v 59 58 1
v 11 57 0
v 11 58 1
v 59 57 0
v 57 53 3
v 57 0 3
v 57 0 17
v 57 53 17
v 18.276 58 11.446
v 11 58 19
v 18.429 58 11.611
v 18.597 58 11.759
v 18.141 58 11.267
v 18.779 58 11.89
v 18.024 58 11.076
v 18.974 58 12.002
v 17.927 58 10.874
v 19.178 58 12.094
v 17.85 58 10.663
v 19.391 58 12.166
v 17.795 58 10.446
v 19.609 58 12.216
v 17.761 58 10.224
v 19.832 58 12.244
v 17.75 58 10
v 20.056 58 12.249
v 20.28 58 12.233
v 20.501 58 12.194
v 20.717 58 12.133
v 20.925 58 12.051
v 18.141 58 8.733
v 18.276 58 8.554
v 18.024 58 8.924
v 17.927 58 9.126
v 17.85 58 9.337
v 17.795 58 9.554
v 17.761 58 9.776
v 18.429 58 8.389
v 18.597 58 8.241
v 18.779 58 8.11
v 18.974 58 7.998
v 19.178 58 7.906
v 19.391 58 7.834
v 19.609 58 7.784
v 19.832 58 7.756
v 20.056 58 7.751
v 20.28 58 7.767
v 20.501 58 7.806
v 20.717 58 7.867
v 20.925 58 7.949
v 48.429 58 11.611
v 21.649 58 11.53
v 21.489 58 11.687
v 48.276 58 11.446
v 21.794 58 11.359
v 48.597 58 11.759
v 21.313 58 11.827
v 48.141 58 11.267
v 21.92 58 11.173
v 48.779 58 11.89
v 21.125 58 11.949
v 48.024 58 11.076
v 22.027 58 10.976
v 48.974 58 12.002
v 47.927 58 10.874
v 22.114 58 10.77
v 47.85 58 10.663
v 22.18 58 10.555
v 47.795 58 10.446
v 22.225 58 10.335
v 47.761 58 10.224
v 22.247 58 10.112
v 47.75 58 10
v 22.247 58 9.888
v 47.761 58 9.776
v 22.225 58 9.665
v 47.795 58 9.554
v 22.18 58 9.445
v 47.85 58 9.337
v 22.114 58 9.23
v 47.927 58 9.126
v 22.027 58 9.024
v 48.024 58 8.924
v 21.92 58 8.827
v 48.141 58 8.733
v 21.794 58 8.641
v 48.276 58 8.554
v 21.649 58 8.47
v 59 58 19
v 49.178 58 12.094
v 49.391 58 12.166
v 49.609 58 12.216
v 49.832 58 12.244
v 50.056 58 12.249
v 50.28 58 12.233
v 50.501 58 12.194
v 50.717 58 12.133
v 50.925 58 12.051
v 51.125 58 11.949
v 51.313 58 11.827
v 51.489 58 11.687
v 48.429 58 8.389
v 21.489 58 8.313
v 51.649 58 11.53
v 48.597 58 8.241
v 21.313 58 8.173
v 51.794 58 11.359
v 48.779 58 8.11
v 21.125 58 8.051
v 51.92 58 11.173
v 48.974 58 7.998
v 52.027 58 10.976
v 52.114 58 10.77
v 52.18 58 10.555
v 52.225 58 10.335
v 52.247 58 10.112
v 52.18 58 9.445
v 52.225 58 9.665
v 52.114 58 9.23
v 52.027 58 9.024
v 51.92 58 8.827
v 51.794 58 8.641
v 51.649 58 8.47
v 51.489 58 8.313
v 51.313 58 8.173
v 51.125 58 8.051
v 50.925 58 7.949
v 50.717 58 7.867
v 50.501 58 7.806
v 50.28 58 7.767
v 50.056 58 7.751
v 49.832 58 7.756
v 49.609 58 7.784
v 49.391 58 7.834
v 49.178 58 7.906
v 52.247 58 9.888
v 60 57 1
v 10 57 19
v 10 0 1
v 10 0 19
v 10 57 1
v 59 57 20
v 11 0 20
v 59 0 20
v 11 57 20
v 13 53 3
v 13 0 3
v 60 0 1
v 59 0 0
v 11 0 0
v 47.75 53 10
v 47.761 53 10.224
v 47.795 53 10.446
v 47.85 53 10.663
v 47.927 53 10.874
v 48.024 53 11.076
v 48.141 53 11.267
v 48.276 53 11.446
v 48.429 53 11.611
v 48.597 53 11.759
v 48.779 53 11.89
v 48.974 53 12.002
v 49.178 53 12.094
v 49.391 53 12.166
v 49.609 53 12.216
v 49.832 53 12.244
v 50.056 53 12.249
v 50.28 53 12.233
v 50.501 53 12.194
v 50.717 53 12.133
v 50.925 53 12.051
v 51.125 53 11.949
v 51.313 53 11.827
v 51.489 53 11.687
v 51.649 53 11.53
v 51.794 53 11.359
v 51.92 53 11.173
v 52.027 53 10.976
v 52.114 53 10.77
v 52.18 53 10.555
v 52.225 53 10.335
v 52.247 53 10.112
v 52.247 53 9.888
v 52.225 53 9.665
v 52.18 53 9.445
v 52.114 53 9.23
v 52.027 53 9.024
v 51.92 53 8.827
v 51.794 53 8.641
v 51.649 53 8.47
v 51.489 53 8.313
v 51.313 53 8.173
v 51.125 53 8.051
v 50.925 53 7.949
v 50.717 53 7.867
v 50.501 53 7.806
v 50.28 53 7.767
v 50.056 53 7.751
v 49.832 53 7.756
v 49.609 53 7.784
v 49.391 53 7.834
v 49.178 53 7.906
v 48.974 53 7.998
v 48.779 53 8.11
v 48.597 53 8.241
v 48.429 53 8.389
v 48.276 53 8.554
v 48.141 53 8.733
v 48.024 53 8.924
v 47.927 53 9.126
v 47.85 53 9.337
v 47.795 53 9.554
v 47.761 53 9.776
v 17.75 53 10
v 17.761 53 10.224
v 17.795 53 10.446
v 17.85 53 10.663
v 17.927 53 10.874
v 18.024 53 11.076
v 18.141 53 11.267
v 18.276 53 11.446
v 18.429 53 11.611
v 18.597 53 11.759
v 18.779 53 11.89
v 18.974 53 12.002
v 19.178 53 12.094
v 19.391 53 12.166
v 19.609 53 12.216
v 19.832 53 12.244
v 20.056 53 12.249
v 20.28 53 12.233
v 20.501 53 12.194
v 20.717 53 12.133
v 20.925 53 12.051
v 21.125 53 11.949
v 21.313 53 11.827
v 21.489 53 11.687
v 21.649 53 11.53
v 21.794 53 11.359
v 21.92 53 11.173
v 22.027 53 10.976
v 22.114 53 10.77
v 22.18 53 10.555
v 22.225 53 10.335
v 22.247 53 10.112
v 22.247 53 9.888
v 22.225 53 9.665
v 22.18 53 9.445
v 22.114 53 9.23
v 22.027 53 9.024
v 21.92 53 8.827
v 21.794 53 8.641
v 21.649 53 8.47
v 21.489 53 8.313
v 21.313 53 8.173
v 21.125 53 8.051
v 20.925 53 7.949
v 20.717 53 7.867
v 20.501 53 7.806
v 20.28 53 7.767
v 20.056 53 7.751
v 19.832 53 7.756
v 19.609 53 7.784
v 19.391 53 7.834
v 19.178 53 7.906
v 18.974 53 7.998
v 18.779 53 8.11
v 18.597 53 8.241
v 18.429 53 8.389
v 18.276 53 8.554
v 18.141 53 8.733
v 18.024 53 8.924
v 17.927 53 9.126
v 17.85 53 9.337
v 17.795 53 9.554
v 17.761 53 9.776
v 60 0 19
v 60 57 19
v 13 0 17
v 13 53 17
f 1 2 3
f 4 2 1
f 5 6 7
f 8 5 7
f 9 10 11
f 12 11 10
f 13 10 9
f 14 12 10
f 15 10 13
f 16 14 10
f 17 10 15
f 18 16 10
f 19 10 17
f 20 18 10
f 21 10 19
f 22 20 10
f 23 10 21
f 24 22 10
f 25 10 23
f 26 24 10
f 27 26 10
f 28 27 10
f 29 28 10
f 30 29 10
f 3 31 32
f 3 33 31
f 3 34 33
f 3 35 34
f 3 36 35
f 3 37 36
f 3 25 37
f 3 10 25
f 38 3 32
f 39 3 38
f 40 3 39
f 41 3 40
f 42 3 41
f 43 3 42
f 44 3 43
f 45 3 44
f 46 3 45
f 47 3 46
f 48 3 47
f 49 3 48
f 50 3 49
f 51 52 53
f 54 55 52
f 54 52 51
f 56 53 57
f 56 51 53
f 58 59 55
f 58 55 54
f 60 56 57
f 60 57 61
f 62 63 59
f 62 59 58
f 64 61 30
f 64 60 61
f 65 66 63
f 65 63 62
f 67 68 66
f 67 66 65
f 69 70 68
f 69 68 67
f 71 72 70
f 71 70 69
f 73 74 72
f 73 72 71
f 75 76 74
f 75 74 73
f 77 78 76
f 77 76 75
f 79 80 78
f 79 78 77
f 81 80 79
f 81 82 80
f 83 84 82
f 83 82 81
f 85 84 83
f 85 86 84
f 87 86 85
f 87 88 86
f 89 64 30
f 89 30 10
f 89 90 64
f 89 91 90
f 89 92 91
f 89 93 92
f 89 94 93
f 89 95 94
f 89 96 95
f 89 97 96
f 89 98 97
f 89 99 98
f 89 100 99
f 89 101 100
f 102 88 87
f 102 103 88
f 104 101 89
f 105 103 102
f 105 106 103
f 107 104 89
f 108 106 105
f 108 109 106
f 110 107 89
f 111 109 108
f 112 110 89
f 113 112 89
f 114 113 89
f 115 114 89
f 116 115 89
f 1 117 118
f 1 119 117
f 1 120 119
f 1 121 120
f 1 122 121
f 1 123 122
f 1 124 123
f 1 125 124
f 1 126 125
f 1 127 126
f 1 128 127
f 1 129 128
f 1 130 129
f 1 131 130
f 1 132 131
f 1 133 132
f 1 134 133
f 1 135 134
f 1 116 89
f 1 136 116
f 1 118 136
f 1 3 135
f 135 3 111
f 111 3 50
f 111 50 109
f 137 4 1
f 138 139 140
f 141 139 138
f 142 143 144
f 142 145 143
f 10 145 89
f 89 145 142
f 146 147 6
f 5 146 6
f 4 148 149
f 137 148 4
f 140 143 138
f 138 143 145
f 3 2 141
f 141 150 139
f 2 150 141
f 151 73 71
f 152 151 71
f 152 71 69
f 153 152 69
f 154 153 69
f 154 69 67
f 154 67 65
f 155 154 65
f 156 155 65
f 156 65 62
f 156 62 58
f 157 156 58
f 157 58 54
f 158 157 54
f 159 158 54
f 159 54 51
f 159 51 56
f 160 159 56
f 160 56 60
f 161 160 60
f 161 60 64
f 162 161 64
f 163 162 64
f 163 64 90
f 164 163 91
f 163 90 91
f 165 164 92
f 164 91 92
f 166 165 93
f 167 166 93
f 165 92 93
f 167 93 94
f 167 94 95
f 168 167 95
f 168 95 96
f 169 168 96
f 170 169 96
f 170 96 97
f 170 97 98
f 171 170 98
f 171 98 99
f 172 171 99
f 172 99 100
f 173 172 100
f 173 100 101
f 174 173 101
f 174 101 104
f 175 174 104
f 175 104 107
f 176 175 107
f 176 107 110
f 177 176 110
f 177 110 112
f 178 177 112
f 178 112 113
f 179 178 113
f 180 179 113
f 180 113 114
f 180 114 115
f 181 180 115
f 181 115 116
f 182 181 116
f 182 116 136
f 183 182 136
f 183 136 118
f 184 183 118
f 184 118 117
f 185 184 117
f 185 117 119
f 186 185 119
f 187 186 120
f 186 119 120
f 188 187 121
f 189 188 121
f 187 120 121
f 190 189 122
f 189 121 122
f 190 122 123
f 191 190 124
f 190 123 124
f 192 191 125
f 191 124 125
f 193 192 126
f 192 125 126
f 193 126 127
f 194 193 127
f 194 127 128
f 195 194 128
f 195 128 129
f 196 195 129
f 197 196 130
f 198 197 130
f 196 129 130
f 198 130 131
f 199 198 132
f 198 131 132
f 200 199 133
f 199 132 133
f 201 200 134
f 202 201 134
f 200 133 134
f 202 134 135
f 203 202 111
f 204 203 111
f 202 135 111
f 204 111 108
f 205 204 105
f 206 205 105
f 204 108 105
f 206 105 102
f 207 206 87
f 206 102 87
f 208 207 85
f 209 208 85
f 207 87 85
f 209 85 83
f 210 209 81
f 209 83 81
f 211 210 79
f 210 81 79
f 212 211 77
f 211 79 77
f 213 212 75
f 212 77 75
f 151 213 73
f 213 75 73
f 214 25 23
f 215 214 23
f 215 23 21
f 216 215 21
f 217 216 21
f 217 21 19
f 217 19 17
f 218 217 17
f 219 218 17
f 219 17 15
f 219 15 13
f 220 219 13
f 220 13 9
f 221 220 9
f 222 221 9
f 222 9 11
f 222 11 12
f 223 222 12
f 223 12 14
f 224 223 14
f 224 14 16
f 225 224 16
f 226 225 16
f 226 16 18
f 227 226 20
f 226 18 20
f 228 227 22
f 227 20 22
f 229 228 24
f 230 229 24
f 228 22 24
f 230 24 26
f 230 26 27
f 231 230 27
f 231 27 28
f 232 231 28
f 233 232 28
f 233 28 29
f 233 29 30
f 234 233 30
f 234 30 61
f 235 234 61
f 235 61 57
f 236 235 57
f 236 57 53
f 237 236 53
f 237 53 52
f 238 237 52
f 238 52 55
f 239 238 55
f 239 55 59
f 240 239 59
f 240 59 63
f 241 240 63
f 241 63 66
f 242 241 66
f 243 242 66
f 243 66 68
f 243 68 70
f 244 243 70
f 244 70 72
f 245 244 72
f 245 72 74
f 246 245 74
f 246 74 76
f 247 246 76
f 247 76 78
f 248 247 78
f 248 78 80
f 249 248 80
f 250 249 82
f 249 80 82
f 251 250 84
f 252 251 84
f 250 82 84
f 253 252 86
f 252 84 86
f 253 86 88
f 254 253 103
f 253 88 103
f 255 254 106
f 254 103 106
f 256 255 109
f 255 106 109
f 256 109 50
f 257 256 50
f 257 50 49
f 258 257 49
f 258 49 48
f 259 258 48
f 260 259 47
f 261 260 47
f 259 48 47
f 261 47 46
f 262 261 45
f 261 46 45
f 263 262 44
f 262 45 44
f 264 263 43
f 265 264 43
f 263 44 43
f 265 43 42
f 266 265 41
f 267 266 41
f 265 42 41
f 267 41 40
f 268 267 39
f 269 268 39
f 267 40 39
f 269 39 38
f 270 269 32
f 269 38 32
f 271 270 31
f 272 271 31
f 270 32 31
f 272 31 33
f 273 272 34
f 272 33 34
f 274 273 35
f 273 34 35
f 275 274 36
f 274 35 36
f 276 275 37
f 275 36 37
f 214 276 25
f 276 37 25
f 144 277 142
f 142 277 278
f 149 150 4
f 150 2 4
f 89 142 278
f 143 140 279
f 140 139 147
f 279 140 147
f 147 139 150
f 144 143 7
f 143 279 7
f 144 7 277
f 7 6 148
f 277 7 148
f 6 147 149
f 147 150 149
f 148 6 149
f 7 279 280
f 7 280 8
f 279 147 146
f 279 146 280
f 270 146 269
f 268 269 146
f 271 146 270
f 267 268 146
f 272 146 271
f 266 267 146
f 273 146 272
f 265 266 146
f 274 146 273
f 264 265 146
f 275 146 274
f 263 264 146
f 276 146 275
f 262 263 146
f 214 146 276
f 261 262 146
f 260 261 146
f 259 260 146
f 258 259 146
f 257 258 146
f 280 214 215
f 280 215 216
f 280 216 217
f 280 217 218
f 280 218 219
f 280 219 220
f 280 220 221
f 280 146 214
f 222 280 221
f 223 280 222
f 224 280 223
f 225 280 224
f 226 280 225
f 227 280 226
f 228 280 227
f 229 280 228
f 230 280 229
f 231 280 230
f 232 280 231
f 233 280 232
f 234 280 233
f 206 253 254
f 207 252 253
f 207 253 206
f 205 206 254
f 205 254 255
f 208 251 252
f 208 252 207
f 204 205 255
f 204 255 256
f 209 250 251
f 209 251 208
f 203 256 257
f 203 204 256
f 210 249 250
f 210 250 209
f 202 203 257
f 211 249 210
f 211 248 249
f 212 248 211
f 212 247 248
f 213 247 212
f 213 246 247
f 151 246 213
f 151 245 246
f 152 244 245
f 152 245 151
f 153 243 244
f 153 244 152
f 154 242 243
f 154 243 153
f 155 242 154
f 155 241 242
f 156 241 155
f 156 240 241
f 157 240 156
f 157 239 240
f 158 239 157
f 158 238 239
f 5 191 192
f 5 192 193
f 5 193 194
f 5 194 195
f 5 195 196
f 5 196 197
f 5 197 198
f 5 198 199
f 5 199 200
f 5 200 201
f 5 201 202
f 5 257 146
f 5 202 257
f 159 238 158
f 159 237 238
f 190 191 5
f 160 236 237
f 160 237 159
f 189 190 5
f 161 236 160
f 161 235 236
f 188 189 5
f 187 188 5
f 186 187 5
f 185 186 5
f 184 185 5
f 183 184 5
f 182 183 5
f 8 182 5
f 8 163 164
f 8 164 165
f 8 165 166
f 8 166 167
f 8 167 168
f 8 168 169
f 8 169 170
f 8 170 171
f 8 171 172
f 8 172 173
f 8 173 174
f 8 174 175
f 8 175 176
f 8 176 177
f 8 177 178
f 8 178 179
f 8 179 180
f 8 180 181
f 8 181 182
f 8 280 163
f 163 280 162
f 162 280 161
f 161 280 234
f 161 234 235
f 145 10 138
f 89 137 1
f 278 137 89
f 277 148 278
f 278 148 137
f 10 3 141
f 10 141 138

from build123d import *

# Parameters (mm, degrees)
SKETCH1_W           = 50
SKETCH1_H           = 58
BOSS_EXTRUDE1_DEPTH = 20
SKETCH2_R           = 2.25
CUT_EXTRUDE1_DEPTH  = 86.813751812
SKETCH3_W           = 44
SKETCH3_H           = 14
CUT_EXTRUDE2_DEPTH  = 53
CHAMFER1_SIZE       = 1


with BuildPart() as part:
    # Sketch1 → Boss-Extrude1 (new body)
    with BuildSketch(Plane.XY):
        with Locations((35, 29)):
            Rectangle(SKETCH1_W, SKETCH1_H)
    extrude(amount=BOSS_EXTRUDE1_DEPTH)

    # Sketch2 → Cut-Extrude1 (cut, through all)
    with BuildSketch(Plane(origin=(0, 58, 0), x_dir=(1, 0, 0), z_dir=(0, 1, 0))):
        with Locations(Location((20, -10, 0), (0, 0, 180))):
            Circle(SKETCH2_R)
        with Locations(Location((50, -10, 0), (0, 0, 180))):
            Circle(SKETCH2_R)
    extrude(amount=-CUT_EXTRUDE1_DEPTH, mode=Mode.SUBTRACT)

    # Sketch3 → Cut-Extrude2 (cut)
    with BuildSketch(Plane.XZ):
        with Locations((35, 10)):
            Rectangle(SKETCH3_W, SKETCH3_H)
    extrude(amount=-CUT_EXTRUDE2_DEPTH, mode=Mode.SUBTRACT)

    # Chamfer1
    chamfer1_edges = [part.edges().sort_by_distance(p)[0] for p in [
        (60, 29, 20),
        (35, 58, 20),
        (60, 29, 0),
        (10, 29, 0),
        (35, 58, 0),
        (60, 58, 10),
        (10, 58, 10),
        (10, 29, 20),
    ]]
    chamfer(chamfer1_edges, length=CHAMFER1_SIZE)


solid = part.part
